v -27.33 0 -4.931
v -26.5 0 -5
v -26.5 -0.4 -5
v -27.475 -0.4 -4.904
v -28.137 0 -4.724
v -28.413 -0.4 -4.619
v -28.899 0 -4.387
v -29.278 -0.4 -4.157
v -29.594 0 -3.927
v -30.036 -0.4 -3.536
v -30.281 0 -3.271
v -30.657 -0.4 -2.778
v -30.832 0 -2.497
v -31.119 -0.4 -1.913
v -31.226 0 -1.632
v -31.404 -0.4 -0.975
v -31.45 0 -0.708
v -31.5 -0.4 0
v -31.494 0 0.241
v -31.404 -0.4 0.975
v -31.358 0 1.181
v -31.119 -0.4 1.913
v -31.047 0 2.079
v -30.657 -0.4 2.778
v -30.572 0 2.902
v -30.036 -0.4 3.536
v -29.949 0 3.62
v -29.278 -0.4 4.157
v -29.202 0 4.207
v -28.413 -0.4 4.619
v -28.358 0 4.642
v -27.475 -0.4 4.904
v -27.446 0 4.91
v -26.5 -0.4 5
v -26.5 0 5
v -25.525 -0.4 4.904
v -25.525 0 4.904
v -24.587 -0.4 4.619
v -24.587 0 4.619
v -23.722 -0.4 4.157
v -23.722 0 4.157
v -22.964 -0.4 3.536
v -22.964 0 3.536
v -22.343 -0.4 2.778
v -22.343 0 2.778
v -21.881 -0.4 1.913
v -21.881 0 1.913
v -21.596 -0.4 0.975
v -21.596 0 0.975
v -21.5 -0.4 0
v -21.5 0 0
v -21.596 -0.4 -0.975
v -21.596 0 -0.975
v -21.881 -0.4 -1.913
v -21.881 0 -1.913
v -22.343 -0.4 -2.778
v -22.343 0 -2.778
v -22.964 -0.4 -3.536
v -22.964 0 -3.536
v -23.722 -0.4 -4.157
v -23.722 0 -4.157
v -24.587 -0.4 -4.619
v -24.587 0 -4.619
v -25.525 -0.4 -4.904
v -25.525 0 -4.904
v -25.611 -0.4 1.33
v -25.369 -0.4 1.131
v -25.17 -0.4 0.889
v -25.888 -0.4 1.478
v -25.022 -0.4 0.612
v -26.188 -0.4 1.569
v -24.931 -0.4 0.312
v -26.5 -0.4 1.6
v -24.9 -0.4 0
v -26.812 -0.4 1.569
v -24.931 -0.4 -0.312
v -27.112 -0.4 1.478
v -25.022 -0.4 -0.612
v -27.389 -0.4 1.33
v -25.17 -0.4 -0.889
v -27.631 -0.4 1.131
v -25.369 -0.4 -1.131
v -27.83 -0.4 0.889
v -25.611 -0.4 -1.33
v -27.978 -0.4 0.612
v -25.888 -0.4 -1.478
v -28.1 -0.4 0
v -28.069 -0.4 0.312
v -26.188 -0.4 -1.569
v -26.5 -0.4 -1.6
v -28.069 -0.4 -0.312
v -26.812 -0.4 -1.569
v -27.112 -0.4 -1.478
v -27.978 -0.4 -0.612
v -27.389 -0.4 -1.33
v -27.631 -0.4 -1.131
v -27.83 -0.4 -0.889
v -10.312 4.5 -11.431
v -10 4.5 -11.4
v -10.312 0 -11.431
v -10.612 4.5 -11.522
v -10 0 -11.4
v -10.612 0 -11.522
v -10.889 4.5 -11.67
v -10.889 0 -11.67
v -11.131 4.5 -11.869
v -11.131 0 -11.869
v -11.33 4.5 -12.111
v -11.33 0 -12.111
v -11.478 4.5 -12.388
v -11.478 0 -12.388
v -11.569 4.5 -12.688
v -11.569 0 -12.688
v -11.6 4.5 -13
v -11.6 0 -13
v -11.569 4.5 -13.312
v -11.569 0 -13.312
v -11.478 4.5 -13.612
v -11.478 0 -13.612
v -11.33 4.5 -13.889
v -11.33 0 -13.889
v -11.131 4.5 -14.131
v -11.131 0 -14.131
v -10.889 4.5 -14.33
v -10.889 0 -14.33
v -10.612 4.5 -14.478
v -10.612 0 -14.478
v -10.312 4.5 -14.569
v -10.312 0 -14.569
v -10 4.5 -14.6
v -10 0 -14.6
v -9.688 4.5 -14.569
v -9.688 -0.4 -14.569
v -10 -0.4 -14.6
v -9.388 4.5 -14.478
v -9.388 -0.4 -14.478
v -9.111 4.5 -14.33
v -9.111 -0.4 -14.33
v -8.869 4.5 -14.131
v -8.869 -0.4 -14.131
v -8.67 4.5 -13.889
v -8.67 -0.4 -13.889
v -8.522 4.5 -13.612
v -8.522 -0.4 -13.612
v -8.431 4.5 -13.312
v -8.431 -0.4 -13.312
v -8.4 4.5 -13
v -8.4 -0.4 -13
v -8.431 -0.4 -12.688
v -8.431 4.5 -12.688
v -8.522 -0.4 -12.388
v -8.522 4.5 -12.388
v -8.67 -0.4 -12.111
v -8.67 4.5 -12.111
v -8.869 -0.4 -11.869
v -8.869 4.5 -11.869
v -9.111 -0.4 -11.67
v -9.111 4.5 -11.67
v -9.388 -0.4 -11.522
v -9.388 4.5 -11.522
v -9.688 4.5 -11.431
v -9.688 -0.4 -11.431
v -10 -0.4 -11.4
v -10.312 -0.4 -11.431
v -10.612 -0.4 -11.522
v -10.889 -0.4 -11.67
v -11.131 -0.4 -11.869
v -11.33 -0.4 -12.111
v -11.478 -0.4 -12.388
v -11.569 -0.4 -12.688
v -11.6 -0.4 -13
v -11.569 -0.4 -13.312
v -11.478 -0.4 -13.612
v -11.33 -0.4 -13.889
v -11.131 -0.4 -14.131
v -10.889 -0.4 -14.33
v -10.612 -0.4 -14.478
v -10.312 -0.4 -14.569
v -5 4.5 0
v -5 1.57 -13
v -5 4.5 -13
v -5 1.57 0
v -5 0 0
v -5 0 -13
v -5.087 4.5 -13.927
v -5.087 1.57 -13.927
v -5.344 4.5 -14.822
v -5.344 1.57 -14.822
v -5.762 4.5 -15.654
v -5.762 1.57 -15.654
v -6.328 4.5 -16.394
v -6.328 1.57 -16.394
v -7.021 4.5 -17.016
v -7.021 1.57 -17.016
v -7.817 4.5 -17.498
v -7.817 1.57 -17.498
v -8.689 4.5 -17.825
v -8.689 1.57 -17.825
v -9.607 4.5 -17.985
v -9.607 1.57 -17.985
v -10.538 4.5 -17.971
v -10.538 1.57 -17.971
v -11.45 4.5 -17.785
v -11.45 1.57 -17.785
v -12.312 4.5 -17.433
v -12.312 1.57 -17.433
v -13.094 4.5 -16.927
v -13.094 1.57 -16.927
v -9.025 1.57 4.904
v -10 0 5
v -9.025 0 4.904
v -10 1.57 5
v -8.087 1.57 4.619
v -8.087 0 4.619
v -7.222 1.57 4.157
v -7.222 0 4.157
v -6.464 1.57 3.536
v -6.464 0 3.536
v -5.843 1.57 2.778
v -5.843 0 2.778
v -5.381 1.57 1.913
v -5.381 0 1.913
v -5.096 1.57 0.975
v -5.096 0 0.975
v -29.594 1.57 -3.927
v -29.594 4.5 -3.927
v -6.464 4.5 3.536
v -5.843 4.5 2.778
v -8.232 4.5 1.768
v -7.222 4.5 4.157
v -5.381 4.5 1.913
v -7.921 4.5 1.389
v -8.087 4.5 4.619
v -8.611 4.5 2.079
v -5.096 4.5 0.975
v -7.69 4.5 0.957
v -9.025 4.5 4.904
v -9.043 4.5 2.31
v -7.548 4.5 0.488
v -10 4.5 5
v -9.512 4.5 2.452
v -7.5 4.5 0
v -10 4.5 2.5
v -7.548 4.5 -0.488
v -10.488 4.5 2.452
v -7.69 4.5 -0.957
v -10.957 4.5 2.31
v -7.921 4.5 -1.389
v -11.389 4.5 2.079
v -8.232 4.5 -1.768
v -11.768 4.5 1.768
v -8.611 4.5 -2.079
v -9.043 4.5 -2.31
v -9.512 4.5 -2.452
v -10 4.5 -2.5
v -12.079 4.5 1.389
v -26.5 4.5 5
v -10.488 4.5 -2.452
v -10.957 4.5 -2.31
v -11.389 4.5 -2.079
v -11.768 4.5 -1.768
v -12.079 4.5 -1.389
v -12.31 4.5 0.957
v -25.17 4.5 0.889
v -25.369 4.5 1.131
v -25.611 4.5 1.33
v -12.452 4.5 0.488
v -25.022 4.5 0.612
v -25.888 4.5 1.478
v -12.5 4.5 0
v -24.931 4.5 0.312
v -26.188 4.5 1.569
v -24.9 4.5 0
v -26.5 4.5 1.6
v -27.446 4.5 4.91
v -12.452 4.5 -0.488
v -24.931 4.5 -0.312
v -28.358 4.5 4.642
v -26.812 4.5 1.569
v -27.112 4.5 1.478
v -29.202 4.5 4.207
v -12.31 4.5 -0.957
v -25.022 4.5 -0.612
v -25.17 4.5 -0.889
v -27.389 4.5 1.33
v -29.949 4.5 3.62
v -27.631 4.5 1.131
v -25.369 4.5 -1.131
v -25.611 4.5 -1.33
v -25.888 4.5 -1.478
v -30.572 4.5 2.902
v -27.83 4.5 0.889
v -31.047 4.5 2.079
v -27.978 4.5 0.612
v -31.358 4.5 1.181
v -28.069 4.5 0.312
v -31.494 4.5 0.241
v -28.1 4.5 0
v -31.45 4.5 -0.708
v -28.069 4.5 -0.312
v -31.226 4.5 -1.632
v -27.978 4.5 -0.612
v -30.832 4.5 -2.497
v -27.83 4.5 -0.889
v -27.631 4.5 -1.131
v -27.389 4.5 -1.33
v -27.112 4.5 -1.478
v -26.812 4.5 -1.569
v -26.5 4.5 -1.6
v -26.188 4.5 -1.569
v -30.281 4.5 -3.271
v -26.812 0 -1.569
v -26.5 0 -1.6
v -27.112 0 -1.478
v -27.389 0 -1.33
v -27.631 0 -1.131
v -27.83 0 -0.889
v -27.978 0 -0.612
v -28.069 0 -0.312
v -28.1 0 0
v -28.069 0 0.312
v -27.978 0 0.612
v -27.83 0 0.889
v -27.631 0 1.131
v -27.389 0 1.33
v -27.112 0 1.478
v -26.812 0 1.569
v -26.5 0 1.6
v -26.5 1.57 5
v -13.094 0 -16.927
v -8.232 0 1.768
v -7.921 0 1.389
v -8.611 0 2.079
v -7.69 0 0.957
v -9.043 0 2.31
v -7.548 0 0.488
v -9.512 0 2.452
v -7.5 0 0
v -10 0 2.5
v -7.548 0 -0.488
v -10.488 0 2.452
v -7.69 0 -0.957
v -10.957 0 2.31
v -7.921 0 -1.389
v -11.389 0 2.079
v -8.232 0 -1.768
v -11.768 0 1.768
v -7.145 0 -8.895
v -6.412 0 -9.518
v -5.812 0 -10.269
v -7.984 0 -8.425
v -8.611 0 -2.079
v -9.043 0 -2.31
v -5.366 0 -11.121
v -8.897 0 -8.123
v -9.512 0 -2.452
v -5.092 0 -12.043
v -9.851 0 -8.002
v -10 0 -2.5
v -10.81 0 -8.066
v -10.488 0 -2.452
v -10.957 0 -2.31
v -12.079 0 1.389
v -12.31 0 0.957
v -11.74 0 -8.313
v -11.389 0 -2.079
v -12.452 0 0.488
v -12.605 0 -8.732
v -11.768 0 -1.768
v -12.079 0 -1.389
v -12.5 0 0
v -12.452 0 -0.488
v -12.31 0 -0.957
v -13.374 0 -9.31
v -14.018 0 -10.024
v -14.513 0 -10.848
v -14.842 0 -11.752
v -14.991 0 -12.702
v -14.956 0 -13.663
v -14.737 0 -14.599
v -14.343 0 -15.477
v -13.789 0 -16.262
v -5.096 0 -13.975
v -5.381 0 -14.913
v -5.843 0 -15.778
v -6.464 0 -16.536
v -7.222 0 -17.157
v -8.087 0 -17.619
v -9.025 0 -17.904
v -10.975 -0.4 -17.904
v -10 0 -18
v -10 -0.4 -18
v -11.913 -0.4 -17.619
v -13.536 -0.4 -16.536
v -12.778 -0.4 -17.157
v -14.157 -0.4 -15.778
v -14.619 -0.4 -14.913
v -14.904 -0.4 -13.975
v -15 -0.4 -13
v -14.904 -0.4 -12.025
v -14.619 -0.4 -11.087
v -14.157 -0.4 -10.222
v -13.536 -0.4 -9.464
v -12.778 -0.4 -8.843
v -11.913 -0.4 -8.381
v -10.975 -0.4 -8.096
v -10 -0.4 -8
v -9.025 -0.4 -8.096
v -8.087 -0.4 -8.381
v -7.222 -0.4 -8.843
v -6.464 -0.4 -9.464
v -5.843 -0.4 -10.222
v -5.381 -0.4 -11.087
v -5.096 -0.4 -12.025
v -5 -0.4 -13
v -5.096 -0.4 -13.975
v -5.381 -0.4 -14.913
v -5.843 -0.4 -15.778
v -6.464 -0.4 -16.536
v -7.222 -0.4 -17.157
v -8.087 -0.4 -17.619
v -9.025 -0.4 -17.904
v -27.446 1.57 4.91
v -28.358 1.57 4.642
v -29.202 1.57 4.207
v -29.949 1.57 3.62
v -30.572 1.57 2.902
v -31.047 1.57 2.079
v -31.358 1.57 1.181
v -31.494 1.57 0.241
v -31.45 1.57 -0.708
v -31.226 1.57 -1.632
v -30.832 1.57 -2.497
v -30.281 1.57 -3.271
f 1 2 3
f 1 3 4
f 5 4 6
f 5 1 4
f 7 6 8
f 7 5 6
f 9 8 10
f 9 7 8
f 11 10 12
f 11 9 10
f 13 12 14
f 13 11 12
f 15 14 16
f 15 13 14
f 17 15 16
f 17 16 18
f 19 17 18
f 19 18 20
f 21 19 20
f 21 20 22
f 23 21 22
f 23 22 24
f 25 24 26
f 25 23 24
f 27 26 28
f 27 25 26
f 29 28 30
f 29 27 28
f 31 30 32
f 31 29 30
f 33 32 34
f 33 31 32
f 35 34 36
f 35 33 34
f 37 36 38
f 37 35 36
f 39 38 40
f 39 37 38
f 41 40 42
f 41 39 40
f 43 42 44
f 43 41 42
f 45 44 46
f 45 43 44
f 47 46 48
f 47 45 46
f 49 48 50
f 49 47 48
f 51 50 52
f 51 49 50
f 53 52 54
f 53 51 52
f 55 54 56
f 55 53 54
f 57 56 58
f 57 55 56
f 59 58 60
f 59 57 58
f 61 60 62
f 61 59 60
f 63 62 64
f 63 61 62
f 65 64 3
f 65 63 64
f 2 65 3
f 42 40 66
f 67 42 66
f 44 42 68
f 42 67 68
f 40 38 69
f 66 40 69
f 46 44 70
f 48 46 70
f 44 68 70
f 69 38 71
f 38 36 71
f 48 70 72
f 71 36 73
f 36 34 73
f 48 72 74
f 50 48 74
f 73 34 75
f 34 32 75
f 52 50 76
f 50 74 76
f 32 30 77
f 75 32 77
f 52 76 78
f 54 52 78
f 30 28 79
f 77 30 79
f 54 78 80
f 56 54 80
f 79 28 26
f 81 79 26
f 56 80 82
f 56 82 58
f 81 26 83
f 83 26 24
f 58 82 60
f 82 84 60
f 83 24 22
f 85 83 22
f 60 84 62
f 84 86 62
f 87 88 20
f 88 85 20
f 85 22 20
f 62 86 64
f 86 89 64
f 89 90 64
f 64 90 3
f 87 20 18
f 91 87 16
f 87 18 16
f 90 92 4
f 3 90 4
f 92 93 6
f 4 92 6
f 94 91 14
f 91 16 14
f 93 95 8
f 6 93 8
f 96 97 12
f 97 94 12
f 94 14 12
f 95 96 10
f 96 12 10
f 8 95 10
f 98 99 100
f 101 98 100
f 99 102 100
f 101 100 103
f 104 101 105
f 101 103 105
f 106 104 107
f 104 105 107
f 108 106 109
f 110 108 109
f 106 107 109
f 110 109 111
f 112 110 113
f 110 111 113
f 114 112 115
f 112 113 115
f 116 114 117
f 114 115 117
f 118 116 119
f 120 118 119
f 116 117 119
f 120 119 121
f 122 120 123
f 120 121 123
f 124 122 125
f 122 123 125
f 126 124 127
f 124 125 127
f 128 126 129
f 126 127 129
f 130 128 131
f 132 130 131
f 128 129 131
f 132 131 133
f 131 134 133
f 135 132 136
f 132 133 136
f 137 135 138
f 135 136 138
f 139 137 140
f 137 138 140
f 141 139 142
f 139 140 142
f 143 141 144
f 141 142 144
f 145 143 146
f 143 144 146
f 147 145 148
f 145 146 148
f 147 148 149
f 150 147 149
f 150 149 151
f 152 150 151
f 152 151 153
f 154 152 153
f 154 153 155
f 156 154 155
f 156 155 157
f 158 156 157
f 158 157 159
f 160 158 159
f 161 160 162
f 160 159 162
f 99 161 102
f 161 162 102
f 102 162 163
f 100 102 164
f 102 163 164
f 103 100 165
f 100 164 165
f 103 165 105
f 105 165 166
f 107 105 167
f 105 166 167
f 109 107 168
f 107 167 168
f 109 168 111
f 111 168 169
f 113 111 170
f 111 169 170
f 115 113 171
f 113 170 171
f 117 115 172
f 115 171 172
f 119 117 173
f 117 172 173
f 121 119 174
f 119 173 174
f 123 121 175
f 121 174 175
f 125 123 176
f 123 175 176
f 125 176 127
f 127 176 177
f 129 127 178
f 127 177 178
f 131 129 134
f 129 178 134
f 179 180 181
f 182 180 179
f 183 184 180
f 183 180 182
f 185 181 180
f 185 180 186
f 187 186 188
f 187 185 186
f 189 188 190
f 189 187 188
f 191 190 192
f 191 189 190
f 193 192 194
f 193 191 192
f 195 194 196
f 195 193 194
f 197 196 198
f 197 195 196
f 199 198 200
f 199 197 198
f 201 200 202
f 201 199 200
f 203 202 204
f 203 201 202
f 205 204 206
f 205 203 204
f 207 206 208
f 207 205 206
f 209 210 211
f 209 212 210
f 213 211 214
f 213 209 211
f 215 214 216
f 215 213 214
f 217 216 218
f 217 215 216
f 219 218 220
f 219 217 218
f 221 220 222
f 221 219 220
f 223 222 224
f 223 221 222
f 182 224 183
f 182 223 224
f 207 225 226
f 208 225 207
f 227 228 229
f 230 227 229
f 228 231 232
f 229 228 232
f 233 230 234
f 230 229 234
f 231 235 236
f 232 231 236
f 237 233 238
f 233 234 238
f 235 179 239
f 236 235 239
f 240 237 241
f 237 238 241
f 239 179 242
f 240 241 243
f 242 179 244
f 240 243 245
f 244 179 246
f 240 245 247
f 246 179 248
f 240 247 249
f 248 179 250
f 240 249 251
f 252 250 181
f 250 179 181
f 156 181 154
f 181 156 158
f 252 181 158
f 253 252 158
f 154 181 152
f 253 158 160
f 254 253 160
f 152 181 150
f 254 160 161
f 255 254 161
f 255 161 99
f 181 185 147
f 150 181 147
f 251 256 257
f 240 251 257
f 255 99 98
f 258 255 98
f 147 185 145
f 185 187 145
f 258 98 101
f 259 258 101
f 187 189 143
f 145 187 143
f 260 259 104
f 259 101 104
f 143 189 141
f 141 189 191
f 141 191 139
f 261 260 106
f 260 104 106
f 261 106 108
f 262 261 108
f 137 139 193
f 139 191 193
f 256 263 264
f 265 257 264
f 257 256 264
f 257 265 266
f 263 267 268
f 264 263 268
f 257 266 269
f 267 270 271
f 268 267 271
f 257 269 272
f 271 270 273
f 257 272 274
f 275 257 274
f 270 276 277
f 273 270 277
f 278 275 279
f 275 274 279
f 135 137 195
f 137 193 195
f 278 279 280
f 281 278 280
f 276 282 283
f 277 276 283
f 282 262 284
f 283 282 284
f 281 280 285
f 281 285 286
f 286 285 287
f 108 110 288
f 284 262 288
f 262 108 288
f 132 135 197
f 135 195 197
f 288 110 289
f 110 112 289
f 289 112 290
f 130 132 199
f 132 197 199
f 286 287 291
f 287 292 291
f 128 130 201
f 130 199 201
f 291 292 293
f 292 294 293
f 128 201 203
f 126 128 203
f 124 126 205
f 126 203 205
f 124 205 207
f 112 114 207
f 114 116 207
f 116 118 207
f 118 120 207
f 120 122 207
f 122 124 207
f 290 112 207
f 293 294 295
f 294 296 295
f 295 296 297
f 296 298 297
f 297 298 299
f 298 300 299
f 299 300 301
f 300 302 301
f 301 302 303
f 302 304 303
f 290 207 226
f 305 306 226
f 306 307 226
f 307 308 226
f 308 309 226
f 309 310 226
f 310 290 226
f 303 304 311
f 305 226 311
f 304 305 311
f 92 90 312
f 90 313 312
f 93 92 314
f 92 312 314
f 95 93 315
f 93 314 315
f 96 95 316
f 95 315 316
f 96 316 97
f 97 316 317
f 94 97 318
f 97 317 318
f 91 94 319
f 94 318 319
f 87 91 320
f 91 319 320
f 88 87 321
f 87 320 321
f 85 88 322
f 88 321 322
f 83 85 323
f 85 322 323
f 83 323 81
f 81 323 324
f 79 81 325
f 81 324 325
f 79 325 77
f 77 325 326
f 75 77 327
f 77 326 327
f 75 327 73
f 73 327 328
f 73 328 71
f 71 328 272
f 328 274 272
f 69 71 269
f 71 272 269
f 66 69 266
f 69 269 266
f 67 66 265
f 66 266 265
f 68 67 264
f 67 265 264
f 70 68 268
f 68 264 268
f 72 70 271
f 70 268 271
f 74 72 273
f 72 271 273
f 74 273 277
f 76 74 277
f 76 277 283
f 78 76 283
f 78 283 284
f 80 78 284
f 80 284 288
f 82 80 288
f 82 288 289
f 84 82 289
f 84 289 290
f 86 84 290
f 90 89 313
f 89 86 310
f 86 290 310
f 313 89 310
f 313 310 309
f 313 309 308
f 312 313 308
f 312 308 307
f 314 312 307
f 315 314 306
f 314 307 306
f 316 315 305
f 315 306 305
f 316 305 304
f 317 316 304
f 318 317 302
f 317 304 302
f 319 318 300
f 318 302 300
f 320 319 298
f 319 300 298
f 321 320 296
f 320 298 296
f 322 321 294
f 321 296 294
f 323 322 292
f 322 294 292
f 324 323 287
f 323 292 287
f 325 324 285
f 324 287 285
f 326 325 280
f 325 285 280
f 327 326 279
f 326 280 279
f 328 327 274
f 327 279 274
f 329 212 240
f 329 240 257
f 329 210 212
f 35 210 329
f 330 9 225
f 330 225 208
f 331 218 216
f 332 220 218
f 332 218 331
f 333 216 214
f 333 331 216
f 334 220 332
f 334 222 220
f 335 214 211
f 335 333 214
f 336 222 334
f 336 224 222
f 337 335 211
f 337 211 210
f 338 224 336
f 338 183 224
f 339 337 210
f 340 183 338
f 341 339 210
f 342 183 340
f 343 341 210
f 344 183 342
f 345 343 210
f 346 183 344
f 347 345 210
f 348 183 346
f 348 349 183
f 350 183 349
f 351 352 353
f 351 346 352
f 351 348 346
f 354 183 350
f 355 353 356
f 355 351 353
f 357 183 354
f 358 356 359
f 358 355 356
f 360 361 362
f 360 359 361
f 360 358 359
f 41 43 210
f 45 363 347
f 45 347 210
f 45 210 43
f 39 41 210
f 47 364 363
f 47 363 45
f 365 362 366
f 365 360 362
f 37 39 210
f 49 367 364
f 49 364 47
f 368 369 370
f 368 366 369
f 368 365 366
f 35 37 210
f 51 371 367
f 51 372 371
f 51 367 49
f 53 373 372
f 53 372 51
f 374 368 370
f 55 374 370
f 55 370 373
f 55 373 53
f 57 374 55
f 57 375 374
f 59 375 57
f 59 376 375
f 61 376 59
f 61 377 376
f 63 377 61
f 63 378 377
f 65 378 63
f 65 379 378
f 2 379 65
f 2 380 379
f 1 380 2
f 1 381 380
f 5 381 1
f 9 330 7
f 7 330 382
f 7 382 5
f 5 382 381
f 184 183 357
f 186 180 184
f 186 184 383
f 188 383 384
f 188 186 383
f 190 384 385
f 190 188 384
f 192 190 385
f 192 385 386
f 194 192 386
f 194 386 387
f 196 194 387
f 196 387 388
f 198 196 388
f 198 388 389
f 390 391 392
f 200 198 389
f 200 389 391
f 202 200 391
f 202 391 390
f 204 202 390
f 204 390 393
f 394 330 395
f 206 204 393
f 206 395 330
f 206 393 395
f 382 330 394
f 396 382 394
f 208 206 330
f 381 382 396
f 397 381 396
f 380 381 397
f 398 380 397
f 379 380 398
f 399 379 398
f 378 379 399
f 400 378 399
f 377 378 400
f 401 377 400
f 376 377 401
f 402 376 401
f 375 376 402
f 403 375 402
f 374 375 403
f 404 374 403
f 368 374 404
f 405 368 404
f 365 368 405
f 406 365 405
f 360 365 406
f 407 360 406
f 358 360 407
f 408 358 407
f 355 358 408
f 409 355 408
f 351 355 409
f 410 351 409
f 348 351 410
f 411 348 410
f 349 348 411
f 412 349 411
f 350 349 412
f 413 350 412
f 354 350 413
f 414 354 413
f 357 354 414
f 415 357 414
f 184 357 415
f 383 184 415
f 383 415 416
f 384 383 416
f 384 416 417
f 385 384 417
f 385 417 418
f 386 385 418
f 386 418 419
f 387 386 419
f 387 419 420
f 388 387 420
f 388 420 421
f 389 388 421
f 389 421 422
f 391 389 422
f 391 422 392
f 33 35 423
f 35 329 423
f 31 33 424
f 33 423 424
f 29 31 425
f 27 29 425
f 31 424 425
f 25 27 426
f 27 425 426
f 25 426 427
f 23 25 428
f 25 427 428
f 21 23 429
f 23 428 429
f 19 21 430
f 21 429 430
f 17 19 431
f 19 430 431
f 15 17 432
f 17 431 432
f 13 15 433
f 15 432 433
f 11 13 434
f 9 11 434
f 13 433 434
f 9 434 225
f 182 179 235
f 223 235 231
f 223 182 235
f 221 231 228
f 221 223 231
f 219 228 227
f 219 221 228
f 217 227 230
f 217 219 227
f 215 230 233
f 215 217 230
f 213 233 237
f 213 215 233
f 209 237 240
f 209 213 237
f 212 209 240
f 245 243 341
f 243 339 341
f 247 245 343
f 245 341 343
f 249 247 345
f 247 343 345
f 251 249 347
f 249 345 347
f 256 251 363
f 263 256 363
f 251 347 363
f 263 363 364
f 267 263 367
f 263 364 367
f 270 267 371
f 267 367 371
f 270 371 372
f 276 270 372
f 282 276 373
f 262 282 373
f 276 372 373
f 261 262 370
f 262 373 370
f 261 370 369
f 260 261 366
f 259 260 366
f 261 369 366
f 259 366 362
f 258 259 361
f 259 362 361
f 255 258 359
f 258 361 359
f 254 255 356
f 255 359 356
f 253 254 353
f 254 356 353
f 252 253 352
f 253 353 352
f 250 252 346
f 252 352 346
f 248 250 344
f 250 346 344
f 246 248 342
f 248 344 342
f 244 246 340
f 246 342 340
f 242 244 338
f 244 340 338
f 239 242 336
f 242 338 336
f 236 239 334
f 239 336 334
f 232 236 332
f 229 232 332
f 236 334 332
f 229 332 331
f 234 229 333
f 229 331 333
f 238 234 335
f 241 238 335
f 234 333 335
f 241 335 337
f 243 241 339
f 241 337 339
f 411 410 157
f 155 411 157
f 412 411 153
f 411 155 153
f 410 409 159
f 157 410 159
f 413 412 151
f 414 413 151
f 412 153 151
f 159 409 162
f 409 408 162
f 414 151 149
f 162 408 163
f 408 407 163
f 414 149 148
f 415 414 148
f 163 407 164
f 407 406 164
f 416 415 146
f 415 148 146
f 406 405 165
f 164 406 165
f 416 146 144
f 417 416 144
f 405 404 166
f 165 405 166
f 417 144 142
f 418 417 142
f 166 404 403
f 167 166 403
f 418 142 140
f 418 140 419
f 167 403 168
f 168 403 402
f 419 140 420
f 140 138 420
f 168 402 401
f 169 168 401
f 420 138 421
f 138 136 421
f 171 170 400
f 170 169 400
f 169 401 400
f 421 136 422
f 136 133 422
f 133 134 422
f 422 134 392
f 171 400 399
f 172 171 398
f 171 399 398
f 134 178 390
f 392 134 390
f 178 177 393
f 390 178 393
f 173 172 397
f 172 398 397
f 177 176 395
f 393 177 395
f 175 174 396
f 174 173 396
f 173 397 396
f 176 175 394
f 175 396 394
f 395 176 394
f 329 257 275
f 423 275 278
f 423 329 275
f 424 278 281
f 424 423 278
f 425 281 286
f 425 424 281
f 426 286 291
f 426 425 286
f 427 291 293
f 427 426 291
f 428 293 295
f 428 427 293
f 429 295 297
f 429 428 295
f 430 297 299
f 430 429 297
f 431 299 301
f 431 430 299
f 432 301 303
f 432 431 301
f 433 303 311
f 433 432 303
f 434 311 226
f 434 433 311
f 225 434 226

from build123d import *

# Parameters (mm, degrees)
SKETCH1_R           = 1.6
SKETCH1_R_2         = 2.5
BOSS_EXTRUDE1_DEPTH = 1.57
FILLET1_R           = 5
SKETCH2_R           = 2.5
SKETCH2_R_2         = 1.6
BOSS_EXTRUDE2_DEPTH = 2.93
SKETCH3_R           = 5
SKETCH3_R_2         = 1.6
BOSS_EXTRUDE3_DEPTH = 0.4


with BuildPart() as part:
    # Sketch1 → Boss-Extrude1 (new body)
    with BuildSketch(Plane(origin=(0, 0, 0), x_dir=(1, 0, 0), z_dir=(0, 1, 0))):
        Polygon((-5, -5), (30.925365976, -5), (-5, 23.304833799), align=None)
        with Locations(Location((16.5, 0, 0), (0, 0, 270))):
            Circle(SKETCH1_R, mode=Mode.SUBTRACT)
        with Locations(Location((0, 0, 0), (0, 0, 270))):
            Circle(SKETCH1_R_2, mode=Mode.SUBTRACT)
        with Locations(Location((0, 13, 0), (0, 0, 270))):
            Circle(SKETCH1_R, mode=Mode.SUBTRACT)
    extrude(amount=BOSS_EXTRUDE1_DEPTH)

    # Fillet1
    fillet1_edges = [part.edges().sort_by_distance(p)[0] for p in [
        (-5, 0.785, -23.304833799),
        (30.925365976, 0.785, 5),
        (-5, 0.785, 5),
    ]]
    fillet(fillet1_edges, radius=FILLET1_R)

    # Sketch2 → Boss-Extrude2 (add)
    with BuildSketch(Plane(origin=(0, 1.57, 0), x_dir=(1, 0, 0), z_dir=(0, 1, 0))):
        with BuildLine():
            Line((19.594361133, 3.927458361), (3.094361133, 16.927458361))
            ThreePointArc((3.094361133, 16.927458361), (-2.182681188, 17.498433375), (-5, 13))
            Line((-5, 13), (-5, 0))
            ThreePointArc((-5, 0), (-3.535533906, -3.535533906), (0, -5))
            Line((0, -5), (16.5, -5))
            ThreePointArc((16.5, -5), (21.224261413, -1.637484075), (19.594361133, 3.927458361))
        make_face()
        with Locations(Location((0, 0, 0), (0, 0, 270))):
            Circle(SKETCH2_R, mode=Mode.SUBTRACT)
        with Locations(Location((16.5, 0, 0), (0, 0, 270))):
            Circle(SKETCH2_R_2, mode=Mode.SUBTRACT)
        with Locations(Location((0, 13, 0), (0, 0, 270))):
            Circle(SKETCH2_R_2, mode=Mode.SUBTRACT)
    extrude(amount=BOSS_EXTRUDE2_DEPTH)

    # Sketch3 → Boss-Extrude3 (add)
    # profile 1 of 2: a face of its own
    with BuildSketch(Plane.XZ):
        with Locations(Location((16.5, 0, 0), (0, 0, 270))):
            Circle(SKETCH3_R)
        with Locations(Location((16.5, 0, 0), (0, 0, 270))):
            Circle(SKETCH3_R_2, mode=Mode.SUBTRACT)
    # profile 2 of 2: a face of its own
    with BuildSketch(Plane.XZ):
        with Locations(Location((0, -13, 0), (0, 0, 270))):
            Circle(SKETCH3_R)
        with Locations(Location((0, -13, 0), (0, 0, 270))):
            Circle(SKETCH3_R_2, mode=Mode.SUBTRACT)
    extrude(amount=BOSS_EXTRUDE3_DEPTH)


with BuildPart() as body_2:
    # Mirror1: mirrored copy
    add(part.part.mirror(Plane(origin=(-5, 1.57, -23.304833799), x_dir=(0, 0, 1), z_dir=(1, 0, 0))))


solid = body_2.part
